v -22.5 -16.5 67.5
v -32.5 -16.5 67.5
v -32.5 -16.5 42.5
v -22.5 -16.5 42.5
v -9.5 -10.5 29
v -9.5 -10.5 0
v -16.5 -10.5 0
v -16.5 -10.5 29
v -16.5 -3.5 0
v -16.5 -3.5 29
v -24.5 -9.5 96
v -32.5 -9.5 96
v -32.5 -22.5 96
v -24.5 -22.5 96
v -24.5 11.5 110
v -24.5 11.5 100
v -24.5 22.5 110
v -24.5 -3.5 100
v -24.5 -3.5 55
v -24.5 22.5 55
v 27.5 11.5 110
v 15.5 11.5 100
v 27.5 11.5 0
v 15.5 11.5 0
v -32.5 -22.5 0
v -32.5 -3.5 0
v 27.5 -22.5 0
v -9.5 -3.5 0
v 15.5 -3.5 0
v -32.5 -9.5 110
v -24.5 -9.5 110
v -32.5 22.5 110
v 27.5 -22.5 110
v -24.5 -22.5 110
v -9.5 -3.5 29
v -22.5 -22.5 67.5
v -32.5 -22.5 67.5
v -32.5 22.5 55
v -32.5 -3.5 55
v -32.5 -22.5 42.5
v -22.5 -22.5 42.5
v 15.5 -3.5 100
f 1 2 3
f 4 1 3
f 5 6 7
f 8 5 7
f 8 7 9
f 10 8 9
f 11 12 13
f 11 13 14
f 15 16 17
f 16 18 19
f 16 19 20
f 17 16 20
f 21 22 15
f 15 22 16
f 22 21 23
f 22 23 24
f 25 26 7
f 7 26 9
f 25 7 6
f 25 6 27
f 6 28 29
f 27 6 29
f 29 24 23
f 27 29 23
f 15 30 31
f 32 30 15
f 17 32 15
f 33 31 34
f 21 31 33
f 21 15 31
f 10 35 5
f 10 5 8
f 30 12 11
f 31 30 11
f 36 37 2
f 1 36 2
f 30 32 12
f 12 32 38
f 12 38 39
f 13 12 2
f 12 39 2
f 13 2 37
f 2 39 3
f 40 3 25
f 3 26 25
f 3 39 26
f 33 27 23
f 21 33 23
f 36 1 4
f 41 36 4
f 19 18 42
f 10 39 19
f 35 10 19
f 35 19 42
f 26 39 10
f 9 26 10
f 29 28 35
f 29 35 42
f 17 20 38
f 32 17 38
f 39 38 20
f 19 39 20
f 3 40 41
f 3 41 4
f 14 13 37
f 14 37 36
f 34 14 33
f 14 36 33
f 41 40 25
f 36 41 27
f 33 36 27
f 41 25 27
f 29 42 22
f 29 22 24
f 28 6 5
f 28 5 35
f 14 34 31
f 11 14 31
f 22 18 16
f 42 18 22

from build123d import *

# Parameters (mm, degrees)
EXTRUDE_1_DEPTH          = 110
SKETCH_2_W               = 8
SKETCH_2_H               = 13
CUT_EXTRUDE_1_DEPTH      = 14
CUT_EXTRUDE_4_DEPTH      = 120.63381629
CUT_EXTRUDE_4_DEPTH_BACK = 15
SKETCH_4_W               = 8
SKETCH_4_H               = 55
SKETCH_5_W               = 7
SKETCH_5_H               = 7
CUT_EXTRUDE_5_DEPTH      = 29
SKETCH_3_W               = 25
SKETCH_3_H               = 6
CUT_EXTRUDE_6_DEPTH      = 10
SKETCH_6_W               = 5
SKETCH_6_H               = 110
CUT_EXTRUDE_7_DEPTH      = 119.30997422


with BuildPart() as part:
    # Эскиз1 → Бобышка-Вытянуть1 (new body)
    with BuildSketch(Plane.XY):
        Polygon((-32.5, 22.5), (-32.5, -22.5), (32.5, -22.5), (32.5, -6.5), (27.5, -6.5), (27.5, 11.5), (-24.5, 11.5), (-24.5, 22.5), align=None)
    extrude(amount=EXTRUDE_1_DEPTH)

    # Эскиз2 → Вырез-Вытянуть1 (cut)
    with BuildSketch(Plane.XY.offset(110)):
        with Locations((-28.5, -16)):
            Rectangle(SKETCH_2_W, SKETCH_2_H)
    extrude(amount=-CUT_EXTRUDE_1_DEPTH, mode=Mode.SUBTRACT)

    # Эскиз4 → Вырез-Вытянуть4 (cut, two sides: drawn at the far end of the back side and taken through both)
    with BuildSketch(Plane(origin=(0, 11.5, 0), x_dir=(1, 0, 0), z_dir=(0, 1, 0)).offset(-CUT_EXTRUDE_4_DEPTH_BACK)):
        Polygon((-24.5, -55), (-24.5, -100), (15.5, -100), (15.5, 0), (-24.5, 0), align=None)
        with Locations((-28.5, -27.5)):
            Rectangle(SKETCH_4_W, SKETCH_4_H)
    extrude(amount=CUT_EXTRUDE_4_DEPTH + CUT_EXTRUDE_4_DEPTH_BACK, mode=Mode.SUBTRACT)

    # Эскиз5 → Вырез-Вытянуть5 (cut)
    with BuildSketch(Plane(origin=(0, 0, 0), x_dir=(-1, 0, 0), z_dir=(0, 0, -1))):
        with Locations((13, -7)):
            Rectangle(SKETCH_5_W, SKETCH_5_H)
    extrude(amount=-CUT_EXTRUDE_5_DEPTH, mode=Mode.SUBTRACT)

    # Эскиз3 → Вырез-Вытянуть6 (cut)
    with BuildSketch(Plane(origin=(-32.5, 0, 0), x_dir=(0, 0, -1), z_dir=(1, 0, 0))):
        with Locations((-55, -19.5)):
            Rectangle(SKETCH_3_W, SKETCH_3_H)
    extrude(amount=CUT_EXTRUDE_6_DEPTH, mode=Mode.SUBTRACT)

    # Эскиз6 → Вырез-Вытянуть7 (cut, through all)
    with BuildSketch(Plane(origin=(0, -6.5, 0), x_dir=(1, 0, 0), z_dir=(0, 1, 0))):
        with Locations((30, -55)):
            Rectangle(SKETCH_6_W, SKETCH_6_H)
    extrude(amount=-CUT_EXTRUDE_7_DEPTH, mode=Mode.SUBTRACT)


solid = part.part
